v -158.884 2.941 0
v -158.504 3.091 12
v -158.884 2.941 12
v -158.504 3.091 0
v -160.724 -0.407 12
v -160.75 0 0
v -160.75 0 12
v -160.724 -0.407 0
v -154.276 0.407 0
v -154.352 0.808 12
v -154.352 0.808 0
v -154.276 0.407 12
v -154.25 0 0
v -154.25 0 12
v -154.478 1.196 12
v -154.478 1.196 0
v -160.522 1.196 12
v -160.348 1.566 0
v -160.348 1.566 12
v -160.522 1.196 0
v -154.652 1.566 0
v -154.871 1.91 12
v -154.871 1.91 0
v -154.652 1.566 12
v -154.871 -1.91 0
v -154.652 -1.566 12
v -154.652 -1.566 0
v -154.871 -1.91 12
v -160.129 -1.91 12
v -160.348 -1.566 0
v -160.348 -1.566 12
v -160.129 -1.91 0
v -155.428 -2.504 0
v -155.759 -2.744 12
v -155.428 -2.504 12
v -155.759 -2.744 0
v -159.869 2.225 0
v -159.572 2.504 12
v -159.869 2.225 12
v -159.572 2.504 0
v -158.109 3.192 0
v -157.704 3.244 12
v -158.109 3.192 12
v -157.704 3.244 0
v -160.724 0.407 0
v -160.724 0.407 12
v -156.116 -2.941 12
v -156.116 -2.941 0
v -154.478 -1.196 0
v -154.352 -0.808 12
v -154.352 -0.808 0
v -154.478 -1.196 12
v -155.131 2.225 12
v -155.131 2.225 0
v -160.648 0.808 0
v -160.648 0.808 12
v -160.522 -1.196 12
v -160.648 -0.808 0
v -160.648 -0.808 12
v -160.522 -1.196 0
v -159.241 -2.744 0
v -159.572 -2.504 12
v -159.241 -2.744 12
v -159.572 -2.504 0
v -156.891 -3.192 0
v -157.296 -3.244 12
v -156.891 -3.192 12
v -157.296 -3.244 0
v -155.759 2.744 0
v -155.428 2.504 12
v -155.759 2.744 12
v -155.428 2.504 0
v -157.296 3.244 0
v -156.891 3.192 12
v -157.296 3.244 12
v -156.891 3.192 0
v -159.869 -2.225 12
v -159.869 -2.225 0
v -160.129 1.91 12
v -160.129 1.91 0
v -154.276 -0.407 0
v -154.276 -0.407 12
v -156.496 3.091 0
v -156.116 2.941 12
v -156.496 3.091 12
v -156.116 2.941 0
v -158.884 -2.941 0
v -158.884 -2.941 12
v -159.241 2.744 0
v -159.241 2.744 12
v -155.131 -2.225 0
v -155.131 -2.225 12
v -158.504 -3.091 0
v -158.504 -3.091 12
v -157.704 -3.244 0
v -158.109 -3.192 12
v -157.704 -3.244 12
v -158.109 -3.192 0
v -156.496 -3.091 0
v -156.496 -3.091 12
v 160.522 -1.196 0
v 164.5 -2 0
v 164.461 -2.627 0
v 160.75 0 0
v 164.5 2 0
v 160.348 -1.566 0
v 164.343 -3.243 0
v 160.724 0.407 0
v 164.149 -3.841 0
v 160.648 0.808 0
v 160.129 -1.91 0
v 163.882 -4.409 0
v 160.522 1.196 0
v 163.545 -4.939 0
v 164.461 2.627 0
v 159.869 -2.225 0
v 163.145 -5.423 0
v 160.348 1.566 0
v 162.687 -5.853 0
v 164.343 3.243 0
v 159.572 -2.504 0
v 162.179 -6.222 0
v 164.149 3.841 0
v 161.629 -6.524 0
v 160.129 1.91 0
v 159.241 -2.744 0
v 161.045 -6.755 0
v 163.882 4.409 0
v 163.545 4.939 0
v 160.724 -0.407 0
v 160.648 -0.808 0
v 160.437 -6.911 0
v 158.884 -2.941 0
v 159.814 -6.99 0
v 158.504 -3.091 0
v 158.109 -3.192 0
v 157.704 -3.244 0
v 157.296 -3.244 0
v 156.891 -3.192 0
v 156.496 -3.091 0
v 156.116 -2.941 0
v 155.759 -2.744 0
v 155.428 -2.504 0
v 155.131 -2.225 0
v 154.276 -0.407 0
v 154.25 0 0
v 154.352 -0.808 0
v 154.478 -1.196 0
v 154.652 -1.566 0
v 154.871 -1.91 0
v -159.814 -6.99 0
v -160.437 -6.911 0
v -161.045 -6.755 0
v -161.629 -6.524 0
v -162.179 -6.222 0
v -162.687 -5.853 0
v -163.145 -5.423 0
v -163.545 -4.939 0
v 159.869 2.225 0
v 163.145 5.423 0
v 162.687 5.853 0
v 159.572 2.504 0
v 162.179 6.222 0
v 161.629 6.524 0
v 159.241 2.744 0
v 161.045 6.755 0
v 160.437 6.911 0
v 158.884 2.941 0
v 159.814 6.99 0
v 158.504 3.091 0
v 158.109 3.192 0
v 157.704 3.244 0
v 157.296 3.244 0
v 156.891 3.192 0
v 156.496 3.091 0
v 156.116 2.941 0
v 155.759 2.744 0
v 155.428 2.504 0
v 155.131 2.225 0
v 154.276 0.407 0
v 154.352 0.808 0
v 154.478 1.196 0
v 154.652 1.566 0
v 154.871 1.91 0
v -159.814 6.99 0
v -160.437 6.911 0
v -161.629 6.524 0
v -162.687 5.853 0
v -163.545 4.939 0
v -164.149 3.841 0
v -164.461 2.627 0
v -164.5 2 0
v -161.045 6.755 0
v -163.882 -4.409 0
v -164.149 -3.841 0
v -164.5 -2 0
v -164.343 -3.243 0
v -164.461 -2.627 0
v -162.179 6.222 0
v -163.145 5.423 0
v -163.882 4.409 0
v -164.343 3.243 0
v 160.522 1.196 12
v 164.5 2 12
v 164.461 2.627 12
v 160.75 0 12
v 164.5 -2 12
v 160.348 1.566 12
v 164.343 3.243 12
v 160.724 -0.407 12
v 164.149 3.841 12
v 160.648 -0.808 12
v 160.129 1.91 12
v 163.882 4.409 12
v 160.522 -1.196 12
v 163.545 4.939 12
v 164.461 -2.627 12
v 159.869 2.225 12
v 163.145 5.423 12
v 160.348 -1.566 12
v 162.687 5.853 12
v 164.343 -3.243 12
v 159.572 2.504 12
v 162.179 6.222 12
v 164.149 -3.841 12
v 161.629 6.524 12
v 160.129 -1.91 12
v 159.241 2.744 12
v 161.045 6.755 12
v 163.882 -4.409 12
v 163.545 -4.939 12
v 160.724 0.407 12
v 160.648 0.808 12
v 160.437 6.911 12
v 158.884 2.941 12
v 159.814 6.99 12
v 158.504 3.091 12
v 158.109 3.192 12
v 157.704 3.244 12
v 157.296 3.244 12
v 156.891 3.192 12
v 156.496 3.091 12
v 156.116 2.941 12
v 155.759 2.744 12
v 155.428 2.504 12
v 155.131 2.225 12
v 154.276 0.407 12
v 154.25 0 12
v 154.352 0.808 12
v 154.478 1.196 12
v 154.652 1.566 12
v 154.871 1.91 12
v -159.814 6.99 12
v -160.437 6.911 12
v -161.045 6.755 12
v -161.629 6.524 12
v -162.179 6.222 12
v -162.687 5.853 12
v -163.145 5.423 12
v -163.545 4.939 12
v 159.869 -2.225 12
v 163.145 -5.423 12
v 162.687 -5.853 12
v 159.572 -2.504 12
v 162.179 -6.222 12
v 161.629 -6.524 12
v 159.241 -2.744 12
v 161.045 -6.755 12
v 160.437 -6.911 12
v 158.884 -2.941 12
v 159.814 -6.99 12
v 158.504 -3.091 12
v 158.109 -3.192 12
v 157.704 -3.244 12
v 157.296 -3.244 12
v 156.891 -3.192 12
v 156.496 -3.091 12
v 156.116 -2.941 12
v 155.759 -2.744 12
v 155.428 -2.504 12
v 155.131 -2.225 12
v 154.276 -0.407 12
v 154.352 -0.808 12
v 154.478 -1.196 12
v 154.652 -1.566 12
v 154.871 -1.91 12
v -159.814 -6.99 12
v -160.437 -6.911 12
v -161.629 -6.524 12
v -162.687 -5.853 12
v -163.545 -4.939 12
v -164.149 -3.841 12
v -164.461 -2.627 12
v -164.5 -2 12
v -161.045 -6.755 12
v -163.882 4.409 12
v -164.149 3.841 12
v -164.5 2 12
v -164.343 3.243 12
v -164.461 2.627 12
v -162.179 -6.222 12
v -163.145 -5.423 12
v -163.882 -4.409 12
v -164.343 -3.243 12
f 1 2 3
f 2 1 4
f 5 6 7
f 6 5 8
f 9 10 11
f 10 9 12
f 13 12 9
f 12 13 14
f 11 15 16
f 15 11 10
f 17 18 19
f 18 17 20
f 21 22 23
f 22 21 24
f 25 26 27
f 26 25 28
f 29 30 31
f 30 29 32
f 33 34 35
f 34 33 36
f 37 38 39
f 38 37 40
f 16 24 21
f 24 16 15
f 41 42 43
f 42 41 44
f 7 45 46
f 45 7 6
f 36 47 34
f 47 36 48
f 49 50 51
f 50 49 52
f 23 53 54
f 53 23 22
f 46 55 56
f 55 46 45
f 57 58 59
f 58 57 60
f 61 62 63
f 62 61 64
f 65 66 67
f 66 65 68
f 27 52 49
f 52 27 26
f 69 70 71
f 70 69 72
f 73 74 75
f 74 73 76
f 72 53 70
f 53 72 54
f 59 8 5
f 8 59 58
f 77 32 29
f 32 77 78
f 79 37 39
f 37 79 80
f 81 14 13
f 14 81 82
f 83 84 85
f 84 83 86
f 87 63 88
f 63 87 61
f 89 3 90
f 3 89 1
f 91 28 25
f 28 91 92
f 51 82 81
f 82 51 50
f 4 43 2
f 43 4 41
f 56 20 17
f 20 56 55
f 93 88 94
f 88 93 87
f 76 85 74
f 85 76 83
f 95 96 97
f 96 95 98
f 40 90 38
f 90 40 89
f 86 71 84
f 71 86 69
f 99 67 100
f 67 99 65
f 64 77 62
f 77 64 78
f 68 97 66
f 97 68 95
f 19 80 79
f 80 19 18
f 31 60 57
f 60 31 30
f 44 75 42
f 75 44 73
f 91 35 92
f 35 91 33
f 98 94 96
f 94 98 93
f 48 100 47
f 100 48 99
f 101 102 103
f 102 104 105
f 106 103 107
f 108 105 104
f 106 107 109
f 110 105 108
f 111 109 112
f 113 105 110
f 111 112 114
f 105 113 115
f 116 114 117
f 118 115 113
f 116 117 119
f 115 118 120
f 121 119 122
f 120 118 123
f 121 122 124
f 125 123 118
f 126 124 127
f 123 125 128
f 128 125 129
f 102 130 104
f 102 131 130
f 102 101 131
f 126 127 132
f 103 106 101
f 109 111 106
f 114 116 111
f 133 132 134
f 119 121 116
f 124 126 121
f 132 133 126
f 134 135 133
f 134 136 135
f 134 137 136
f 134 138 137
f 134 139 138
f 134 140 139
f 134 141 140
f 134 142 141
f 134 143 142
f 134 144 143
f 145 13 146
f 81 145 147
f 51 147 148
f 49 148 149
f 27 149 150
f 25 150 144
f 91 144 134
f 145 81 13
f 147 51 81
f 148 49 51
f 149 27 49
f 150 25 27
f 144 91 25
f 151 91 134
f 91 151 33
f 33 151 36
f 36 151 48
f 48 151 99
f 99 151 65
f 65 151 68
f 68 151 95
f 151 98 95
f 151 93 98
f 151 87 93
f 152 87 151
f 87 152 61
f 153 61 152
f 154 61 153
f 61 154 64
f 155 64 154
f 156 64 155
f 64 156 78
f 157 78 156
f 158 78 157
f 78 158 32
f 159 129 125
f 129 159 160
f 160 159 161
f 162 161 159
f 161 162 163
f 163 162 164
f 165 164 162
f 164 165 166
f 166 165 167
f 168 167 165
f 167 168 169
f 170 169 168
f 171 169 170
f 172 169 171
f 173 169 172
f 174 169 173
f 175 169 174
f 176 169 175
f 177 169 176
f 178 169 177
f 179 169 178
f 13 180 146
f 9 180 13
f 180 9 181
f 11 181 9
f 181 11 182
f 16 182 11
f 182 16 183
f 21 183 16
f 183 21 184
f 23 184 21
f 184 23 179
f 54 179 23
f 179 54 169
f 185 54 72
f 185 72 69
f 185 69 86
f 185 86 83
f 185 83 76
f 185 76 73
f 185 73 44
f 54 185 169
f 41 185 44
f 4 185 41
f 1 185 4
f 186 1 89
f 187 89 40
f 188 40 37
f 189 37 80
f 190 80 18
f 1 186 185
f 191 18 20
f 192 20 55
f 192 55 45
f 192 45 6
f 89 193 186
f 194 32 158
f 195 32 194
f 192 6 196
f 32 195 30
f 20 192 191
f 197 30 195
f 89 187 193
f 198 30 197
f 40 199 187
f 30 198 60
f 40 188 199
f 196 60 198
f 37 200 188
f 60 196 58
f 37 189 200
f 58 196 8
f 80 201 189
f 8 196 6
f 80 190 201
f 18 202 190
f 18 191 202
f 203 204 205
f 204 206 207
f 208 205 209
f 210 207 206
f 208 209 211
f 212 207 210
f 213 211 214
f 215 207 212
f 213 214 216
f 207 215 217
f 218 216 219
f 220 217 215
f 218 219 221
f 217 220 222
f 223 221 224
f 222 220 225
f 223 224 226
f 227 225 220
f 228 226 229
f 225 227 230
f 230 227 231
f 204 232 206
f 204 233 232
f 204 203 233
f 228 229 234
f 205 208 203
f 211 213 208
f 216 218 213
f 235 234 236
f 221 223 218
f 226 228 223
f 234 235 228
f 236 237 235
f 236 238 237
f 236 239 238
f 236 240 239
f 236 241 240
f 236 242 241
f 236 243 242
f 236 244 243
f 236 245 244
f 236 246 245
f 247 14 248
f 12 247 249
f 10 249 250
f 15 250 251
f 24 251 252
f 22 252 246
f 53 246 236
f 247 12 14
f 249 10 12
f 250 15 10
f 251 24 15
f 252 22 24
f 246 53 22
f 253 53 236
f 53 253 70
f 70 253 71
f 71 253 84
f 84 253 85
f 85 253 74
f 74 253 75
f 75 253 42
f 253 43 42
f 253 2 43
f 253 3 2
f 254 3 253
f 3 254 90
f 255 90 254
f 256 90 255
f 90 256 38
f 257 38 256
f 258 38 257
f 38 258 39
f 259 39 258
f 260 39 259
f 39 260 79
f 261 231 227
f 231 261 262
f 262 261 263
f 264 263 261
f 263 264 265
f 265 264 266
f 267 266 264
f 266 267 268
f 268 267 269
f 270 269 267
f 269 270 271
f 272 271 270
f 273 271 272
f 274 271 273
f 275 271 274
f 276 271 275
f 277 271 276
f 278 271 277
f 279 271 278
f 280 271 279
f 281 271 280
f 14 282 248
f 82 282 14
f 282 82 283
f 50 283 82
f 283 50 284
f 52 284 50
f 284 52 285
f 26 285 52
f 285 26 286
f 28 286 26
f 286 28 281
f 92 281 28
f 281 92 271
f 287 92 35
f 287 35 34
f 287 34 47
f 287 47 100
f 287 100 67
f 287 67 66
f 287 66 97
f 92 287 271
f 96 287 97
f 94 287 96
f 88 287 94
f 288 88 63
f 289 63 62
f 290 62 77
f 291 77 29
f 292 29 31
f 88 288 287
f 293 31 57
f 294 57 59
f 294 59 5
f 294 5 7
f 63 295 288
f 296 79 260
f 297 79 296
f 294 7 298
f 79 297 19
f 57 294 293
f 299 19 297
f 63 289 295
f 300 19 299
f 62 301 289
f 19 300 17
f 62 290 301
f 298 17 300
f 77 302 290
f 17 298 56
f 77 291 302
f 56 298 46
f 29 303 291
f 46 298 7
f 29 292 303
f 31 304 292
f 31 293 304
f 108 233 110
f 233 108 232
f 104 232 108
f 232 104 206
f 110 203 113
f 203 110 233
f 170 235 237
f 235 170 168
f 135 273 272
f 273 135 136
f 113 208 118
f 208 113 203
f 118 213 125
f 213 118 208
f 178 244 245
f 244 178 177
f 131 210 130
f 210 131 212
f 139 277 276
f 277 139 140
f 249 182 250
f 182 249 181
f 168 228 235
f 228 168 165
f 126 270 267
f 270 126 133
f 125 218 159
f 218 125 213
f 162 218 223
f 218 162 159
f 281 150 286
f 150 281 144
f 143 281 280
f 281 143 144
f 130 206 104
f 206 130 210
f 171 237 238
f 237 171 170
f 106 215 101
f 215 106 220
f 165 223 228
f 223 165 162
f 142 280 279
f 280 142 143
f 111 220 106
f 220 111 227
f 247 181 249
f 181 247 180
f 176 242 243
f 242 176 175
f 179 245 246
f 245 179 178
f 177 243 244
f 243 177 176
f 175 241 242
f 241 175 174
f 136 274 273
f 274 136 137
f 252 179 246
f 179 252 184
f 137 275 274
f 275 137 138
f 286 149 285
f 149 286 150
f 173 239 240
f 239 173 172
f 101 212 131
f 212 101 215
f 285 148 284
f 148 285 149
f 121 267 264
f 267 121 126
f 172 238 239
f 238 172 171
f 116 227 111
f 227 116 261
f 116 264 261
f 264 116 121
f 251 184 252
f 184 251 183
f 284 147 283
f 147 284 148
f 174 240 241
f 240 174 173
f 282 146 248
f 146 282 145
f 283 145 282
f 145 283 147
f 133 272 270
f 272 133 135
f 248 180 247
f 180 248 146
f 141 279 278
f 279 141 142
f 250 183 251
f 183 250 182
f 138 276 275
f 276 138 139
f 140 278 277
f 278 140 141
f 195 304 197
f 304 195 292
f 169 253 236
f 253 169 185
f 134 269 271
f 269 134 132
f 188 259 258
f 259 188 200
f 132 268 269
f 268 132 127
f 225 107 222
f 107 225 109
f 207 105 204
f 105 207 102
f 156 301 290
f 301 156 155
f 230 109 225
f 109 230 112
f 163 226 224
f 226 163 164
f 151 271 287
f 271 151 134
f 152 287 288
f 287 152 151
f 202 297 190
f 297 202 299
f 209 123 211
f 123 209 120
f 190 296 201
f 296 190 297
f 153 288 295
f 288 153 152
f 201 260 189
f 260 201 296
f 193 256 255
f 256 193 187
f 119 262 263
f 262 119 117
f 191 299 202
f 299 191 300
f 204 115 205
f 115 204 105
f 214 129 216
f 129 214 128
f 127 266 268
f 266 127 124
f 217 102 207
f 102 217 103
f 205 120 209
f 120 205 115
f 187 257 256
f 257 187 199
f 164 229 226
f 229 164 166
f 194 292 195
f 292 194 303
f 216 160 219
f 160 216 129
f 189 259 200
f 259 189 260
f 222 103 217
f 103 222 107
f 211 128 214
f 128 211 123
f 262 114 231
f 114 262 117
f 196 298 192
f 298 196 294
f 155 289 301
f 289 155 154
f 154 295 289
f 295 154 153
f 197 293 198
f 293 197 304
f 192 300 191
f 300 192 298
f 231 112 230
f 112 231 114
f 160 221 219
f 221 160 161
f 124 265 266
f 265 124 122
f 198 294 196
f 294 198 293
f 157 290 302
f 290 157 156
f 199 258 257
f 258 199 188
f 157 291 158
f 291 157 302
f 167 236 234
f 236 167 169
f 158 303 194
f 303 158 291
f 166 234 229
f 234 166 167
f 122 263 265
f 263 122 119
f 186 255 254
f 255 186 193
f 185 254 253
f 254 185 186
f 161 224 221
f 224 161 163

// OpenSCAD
$fn = 50;


difference() {
	union() {
		hull() {
			translate(v = [-159.5000000000, 2.0000000000, 0]) {
				cylinder(h = 12, r = 5);
			}
			translate(v = [159.5000000000, 2.0000000000, 0]) {
				cylinder(h = 12, r = 5);
			}
			translate(v = [-159.5000000000, -2.0000000000, 0]) {
				cylinder(h = 12, r = 5);
			}
			translate(v = [159.5000000000, -2.0000000000, 0]) {
				cylinder(h = 12, r = 5);
			}
		}
	}
	union() {
		translate(v = [-157.5000000000, 0.0000000000, 0]) {
			cylinder(h = 12, r = 3.2500000000);
		}
		translate(v = [157.5000000000, 0.0000000000, 0]) {
			cylinder(h = 12, r = 3.2500000000);
		}
		translate(v = [-157.5000000000, 0.0000000000, 0]) {
			cylinder(h = 12, r = 1.8000000000);
		}
		translate(v = [157.5000000000, 0.0000000000, 0]) {
			cylinder(h = 12, r = 1.8000000000);
		}
		translate(v = [-157.5000000000, 0.0000000000, 0]) {
			cylinder(h = 12, r = 1.8000000000);
		}
		translate(v = [157.5000000000, 0.0000000000, 0]) {
			cylinder(h = 12, r = 1.8000000000);
		}
		translate(v = [-157.5000000000, 0.0000000000, 0]) {
			cylinder(h = 12, r = 1.8000000000);
		}
		translate(v = [157.5000000000, 0.0000000000, 0]) {
			cylinder(h = 12, r = 1.8000000000);
		}
	}
}
